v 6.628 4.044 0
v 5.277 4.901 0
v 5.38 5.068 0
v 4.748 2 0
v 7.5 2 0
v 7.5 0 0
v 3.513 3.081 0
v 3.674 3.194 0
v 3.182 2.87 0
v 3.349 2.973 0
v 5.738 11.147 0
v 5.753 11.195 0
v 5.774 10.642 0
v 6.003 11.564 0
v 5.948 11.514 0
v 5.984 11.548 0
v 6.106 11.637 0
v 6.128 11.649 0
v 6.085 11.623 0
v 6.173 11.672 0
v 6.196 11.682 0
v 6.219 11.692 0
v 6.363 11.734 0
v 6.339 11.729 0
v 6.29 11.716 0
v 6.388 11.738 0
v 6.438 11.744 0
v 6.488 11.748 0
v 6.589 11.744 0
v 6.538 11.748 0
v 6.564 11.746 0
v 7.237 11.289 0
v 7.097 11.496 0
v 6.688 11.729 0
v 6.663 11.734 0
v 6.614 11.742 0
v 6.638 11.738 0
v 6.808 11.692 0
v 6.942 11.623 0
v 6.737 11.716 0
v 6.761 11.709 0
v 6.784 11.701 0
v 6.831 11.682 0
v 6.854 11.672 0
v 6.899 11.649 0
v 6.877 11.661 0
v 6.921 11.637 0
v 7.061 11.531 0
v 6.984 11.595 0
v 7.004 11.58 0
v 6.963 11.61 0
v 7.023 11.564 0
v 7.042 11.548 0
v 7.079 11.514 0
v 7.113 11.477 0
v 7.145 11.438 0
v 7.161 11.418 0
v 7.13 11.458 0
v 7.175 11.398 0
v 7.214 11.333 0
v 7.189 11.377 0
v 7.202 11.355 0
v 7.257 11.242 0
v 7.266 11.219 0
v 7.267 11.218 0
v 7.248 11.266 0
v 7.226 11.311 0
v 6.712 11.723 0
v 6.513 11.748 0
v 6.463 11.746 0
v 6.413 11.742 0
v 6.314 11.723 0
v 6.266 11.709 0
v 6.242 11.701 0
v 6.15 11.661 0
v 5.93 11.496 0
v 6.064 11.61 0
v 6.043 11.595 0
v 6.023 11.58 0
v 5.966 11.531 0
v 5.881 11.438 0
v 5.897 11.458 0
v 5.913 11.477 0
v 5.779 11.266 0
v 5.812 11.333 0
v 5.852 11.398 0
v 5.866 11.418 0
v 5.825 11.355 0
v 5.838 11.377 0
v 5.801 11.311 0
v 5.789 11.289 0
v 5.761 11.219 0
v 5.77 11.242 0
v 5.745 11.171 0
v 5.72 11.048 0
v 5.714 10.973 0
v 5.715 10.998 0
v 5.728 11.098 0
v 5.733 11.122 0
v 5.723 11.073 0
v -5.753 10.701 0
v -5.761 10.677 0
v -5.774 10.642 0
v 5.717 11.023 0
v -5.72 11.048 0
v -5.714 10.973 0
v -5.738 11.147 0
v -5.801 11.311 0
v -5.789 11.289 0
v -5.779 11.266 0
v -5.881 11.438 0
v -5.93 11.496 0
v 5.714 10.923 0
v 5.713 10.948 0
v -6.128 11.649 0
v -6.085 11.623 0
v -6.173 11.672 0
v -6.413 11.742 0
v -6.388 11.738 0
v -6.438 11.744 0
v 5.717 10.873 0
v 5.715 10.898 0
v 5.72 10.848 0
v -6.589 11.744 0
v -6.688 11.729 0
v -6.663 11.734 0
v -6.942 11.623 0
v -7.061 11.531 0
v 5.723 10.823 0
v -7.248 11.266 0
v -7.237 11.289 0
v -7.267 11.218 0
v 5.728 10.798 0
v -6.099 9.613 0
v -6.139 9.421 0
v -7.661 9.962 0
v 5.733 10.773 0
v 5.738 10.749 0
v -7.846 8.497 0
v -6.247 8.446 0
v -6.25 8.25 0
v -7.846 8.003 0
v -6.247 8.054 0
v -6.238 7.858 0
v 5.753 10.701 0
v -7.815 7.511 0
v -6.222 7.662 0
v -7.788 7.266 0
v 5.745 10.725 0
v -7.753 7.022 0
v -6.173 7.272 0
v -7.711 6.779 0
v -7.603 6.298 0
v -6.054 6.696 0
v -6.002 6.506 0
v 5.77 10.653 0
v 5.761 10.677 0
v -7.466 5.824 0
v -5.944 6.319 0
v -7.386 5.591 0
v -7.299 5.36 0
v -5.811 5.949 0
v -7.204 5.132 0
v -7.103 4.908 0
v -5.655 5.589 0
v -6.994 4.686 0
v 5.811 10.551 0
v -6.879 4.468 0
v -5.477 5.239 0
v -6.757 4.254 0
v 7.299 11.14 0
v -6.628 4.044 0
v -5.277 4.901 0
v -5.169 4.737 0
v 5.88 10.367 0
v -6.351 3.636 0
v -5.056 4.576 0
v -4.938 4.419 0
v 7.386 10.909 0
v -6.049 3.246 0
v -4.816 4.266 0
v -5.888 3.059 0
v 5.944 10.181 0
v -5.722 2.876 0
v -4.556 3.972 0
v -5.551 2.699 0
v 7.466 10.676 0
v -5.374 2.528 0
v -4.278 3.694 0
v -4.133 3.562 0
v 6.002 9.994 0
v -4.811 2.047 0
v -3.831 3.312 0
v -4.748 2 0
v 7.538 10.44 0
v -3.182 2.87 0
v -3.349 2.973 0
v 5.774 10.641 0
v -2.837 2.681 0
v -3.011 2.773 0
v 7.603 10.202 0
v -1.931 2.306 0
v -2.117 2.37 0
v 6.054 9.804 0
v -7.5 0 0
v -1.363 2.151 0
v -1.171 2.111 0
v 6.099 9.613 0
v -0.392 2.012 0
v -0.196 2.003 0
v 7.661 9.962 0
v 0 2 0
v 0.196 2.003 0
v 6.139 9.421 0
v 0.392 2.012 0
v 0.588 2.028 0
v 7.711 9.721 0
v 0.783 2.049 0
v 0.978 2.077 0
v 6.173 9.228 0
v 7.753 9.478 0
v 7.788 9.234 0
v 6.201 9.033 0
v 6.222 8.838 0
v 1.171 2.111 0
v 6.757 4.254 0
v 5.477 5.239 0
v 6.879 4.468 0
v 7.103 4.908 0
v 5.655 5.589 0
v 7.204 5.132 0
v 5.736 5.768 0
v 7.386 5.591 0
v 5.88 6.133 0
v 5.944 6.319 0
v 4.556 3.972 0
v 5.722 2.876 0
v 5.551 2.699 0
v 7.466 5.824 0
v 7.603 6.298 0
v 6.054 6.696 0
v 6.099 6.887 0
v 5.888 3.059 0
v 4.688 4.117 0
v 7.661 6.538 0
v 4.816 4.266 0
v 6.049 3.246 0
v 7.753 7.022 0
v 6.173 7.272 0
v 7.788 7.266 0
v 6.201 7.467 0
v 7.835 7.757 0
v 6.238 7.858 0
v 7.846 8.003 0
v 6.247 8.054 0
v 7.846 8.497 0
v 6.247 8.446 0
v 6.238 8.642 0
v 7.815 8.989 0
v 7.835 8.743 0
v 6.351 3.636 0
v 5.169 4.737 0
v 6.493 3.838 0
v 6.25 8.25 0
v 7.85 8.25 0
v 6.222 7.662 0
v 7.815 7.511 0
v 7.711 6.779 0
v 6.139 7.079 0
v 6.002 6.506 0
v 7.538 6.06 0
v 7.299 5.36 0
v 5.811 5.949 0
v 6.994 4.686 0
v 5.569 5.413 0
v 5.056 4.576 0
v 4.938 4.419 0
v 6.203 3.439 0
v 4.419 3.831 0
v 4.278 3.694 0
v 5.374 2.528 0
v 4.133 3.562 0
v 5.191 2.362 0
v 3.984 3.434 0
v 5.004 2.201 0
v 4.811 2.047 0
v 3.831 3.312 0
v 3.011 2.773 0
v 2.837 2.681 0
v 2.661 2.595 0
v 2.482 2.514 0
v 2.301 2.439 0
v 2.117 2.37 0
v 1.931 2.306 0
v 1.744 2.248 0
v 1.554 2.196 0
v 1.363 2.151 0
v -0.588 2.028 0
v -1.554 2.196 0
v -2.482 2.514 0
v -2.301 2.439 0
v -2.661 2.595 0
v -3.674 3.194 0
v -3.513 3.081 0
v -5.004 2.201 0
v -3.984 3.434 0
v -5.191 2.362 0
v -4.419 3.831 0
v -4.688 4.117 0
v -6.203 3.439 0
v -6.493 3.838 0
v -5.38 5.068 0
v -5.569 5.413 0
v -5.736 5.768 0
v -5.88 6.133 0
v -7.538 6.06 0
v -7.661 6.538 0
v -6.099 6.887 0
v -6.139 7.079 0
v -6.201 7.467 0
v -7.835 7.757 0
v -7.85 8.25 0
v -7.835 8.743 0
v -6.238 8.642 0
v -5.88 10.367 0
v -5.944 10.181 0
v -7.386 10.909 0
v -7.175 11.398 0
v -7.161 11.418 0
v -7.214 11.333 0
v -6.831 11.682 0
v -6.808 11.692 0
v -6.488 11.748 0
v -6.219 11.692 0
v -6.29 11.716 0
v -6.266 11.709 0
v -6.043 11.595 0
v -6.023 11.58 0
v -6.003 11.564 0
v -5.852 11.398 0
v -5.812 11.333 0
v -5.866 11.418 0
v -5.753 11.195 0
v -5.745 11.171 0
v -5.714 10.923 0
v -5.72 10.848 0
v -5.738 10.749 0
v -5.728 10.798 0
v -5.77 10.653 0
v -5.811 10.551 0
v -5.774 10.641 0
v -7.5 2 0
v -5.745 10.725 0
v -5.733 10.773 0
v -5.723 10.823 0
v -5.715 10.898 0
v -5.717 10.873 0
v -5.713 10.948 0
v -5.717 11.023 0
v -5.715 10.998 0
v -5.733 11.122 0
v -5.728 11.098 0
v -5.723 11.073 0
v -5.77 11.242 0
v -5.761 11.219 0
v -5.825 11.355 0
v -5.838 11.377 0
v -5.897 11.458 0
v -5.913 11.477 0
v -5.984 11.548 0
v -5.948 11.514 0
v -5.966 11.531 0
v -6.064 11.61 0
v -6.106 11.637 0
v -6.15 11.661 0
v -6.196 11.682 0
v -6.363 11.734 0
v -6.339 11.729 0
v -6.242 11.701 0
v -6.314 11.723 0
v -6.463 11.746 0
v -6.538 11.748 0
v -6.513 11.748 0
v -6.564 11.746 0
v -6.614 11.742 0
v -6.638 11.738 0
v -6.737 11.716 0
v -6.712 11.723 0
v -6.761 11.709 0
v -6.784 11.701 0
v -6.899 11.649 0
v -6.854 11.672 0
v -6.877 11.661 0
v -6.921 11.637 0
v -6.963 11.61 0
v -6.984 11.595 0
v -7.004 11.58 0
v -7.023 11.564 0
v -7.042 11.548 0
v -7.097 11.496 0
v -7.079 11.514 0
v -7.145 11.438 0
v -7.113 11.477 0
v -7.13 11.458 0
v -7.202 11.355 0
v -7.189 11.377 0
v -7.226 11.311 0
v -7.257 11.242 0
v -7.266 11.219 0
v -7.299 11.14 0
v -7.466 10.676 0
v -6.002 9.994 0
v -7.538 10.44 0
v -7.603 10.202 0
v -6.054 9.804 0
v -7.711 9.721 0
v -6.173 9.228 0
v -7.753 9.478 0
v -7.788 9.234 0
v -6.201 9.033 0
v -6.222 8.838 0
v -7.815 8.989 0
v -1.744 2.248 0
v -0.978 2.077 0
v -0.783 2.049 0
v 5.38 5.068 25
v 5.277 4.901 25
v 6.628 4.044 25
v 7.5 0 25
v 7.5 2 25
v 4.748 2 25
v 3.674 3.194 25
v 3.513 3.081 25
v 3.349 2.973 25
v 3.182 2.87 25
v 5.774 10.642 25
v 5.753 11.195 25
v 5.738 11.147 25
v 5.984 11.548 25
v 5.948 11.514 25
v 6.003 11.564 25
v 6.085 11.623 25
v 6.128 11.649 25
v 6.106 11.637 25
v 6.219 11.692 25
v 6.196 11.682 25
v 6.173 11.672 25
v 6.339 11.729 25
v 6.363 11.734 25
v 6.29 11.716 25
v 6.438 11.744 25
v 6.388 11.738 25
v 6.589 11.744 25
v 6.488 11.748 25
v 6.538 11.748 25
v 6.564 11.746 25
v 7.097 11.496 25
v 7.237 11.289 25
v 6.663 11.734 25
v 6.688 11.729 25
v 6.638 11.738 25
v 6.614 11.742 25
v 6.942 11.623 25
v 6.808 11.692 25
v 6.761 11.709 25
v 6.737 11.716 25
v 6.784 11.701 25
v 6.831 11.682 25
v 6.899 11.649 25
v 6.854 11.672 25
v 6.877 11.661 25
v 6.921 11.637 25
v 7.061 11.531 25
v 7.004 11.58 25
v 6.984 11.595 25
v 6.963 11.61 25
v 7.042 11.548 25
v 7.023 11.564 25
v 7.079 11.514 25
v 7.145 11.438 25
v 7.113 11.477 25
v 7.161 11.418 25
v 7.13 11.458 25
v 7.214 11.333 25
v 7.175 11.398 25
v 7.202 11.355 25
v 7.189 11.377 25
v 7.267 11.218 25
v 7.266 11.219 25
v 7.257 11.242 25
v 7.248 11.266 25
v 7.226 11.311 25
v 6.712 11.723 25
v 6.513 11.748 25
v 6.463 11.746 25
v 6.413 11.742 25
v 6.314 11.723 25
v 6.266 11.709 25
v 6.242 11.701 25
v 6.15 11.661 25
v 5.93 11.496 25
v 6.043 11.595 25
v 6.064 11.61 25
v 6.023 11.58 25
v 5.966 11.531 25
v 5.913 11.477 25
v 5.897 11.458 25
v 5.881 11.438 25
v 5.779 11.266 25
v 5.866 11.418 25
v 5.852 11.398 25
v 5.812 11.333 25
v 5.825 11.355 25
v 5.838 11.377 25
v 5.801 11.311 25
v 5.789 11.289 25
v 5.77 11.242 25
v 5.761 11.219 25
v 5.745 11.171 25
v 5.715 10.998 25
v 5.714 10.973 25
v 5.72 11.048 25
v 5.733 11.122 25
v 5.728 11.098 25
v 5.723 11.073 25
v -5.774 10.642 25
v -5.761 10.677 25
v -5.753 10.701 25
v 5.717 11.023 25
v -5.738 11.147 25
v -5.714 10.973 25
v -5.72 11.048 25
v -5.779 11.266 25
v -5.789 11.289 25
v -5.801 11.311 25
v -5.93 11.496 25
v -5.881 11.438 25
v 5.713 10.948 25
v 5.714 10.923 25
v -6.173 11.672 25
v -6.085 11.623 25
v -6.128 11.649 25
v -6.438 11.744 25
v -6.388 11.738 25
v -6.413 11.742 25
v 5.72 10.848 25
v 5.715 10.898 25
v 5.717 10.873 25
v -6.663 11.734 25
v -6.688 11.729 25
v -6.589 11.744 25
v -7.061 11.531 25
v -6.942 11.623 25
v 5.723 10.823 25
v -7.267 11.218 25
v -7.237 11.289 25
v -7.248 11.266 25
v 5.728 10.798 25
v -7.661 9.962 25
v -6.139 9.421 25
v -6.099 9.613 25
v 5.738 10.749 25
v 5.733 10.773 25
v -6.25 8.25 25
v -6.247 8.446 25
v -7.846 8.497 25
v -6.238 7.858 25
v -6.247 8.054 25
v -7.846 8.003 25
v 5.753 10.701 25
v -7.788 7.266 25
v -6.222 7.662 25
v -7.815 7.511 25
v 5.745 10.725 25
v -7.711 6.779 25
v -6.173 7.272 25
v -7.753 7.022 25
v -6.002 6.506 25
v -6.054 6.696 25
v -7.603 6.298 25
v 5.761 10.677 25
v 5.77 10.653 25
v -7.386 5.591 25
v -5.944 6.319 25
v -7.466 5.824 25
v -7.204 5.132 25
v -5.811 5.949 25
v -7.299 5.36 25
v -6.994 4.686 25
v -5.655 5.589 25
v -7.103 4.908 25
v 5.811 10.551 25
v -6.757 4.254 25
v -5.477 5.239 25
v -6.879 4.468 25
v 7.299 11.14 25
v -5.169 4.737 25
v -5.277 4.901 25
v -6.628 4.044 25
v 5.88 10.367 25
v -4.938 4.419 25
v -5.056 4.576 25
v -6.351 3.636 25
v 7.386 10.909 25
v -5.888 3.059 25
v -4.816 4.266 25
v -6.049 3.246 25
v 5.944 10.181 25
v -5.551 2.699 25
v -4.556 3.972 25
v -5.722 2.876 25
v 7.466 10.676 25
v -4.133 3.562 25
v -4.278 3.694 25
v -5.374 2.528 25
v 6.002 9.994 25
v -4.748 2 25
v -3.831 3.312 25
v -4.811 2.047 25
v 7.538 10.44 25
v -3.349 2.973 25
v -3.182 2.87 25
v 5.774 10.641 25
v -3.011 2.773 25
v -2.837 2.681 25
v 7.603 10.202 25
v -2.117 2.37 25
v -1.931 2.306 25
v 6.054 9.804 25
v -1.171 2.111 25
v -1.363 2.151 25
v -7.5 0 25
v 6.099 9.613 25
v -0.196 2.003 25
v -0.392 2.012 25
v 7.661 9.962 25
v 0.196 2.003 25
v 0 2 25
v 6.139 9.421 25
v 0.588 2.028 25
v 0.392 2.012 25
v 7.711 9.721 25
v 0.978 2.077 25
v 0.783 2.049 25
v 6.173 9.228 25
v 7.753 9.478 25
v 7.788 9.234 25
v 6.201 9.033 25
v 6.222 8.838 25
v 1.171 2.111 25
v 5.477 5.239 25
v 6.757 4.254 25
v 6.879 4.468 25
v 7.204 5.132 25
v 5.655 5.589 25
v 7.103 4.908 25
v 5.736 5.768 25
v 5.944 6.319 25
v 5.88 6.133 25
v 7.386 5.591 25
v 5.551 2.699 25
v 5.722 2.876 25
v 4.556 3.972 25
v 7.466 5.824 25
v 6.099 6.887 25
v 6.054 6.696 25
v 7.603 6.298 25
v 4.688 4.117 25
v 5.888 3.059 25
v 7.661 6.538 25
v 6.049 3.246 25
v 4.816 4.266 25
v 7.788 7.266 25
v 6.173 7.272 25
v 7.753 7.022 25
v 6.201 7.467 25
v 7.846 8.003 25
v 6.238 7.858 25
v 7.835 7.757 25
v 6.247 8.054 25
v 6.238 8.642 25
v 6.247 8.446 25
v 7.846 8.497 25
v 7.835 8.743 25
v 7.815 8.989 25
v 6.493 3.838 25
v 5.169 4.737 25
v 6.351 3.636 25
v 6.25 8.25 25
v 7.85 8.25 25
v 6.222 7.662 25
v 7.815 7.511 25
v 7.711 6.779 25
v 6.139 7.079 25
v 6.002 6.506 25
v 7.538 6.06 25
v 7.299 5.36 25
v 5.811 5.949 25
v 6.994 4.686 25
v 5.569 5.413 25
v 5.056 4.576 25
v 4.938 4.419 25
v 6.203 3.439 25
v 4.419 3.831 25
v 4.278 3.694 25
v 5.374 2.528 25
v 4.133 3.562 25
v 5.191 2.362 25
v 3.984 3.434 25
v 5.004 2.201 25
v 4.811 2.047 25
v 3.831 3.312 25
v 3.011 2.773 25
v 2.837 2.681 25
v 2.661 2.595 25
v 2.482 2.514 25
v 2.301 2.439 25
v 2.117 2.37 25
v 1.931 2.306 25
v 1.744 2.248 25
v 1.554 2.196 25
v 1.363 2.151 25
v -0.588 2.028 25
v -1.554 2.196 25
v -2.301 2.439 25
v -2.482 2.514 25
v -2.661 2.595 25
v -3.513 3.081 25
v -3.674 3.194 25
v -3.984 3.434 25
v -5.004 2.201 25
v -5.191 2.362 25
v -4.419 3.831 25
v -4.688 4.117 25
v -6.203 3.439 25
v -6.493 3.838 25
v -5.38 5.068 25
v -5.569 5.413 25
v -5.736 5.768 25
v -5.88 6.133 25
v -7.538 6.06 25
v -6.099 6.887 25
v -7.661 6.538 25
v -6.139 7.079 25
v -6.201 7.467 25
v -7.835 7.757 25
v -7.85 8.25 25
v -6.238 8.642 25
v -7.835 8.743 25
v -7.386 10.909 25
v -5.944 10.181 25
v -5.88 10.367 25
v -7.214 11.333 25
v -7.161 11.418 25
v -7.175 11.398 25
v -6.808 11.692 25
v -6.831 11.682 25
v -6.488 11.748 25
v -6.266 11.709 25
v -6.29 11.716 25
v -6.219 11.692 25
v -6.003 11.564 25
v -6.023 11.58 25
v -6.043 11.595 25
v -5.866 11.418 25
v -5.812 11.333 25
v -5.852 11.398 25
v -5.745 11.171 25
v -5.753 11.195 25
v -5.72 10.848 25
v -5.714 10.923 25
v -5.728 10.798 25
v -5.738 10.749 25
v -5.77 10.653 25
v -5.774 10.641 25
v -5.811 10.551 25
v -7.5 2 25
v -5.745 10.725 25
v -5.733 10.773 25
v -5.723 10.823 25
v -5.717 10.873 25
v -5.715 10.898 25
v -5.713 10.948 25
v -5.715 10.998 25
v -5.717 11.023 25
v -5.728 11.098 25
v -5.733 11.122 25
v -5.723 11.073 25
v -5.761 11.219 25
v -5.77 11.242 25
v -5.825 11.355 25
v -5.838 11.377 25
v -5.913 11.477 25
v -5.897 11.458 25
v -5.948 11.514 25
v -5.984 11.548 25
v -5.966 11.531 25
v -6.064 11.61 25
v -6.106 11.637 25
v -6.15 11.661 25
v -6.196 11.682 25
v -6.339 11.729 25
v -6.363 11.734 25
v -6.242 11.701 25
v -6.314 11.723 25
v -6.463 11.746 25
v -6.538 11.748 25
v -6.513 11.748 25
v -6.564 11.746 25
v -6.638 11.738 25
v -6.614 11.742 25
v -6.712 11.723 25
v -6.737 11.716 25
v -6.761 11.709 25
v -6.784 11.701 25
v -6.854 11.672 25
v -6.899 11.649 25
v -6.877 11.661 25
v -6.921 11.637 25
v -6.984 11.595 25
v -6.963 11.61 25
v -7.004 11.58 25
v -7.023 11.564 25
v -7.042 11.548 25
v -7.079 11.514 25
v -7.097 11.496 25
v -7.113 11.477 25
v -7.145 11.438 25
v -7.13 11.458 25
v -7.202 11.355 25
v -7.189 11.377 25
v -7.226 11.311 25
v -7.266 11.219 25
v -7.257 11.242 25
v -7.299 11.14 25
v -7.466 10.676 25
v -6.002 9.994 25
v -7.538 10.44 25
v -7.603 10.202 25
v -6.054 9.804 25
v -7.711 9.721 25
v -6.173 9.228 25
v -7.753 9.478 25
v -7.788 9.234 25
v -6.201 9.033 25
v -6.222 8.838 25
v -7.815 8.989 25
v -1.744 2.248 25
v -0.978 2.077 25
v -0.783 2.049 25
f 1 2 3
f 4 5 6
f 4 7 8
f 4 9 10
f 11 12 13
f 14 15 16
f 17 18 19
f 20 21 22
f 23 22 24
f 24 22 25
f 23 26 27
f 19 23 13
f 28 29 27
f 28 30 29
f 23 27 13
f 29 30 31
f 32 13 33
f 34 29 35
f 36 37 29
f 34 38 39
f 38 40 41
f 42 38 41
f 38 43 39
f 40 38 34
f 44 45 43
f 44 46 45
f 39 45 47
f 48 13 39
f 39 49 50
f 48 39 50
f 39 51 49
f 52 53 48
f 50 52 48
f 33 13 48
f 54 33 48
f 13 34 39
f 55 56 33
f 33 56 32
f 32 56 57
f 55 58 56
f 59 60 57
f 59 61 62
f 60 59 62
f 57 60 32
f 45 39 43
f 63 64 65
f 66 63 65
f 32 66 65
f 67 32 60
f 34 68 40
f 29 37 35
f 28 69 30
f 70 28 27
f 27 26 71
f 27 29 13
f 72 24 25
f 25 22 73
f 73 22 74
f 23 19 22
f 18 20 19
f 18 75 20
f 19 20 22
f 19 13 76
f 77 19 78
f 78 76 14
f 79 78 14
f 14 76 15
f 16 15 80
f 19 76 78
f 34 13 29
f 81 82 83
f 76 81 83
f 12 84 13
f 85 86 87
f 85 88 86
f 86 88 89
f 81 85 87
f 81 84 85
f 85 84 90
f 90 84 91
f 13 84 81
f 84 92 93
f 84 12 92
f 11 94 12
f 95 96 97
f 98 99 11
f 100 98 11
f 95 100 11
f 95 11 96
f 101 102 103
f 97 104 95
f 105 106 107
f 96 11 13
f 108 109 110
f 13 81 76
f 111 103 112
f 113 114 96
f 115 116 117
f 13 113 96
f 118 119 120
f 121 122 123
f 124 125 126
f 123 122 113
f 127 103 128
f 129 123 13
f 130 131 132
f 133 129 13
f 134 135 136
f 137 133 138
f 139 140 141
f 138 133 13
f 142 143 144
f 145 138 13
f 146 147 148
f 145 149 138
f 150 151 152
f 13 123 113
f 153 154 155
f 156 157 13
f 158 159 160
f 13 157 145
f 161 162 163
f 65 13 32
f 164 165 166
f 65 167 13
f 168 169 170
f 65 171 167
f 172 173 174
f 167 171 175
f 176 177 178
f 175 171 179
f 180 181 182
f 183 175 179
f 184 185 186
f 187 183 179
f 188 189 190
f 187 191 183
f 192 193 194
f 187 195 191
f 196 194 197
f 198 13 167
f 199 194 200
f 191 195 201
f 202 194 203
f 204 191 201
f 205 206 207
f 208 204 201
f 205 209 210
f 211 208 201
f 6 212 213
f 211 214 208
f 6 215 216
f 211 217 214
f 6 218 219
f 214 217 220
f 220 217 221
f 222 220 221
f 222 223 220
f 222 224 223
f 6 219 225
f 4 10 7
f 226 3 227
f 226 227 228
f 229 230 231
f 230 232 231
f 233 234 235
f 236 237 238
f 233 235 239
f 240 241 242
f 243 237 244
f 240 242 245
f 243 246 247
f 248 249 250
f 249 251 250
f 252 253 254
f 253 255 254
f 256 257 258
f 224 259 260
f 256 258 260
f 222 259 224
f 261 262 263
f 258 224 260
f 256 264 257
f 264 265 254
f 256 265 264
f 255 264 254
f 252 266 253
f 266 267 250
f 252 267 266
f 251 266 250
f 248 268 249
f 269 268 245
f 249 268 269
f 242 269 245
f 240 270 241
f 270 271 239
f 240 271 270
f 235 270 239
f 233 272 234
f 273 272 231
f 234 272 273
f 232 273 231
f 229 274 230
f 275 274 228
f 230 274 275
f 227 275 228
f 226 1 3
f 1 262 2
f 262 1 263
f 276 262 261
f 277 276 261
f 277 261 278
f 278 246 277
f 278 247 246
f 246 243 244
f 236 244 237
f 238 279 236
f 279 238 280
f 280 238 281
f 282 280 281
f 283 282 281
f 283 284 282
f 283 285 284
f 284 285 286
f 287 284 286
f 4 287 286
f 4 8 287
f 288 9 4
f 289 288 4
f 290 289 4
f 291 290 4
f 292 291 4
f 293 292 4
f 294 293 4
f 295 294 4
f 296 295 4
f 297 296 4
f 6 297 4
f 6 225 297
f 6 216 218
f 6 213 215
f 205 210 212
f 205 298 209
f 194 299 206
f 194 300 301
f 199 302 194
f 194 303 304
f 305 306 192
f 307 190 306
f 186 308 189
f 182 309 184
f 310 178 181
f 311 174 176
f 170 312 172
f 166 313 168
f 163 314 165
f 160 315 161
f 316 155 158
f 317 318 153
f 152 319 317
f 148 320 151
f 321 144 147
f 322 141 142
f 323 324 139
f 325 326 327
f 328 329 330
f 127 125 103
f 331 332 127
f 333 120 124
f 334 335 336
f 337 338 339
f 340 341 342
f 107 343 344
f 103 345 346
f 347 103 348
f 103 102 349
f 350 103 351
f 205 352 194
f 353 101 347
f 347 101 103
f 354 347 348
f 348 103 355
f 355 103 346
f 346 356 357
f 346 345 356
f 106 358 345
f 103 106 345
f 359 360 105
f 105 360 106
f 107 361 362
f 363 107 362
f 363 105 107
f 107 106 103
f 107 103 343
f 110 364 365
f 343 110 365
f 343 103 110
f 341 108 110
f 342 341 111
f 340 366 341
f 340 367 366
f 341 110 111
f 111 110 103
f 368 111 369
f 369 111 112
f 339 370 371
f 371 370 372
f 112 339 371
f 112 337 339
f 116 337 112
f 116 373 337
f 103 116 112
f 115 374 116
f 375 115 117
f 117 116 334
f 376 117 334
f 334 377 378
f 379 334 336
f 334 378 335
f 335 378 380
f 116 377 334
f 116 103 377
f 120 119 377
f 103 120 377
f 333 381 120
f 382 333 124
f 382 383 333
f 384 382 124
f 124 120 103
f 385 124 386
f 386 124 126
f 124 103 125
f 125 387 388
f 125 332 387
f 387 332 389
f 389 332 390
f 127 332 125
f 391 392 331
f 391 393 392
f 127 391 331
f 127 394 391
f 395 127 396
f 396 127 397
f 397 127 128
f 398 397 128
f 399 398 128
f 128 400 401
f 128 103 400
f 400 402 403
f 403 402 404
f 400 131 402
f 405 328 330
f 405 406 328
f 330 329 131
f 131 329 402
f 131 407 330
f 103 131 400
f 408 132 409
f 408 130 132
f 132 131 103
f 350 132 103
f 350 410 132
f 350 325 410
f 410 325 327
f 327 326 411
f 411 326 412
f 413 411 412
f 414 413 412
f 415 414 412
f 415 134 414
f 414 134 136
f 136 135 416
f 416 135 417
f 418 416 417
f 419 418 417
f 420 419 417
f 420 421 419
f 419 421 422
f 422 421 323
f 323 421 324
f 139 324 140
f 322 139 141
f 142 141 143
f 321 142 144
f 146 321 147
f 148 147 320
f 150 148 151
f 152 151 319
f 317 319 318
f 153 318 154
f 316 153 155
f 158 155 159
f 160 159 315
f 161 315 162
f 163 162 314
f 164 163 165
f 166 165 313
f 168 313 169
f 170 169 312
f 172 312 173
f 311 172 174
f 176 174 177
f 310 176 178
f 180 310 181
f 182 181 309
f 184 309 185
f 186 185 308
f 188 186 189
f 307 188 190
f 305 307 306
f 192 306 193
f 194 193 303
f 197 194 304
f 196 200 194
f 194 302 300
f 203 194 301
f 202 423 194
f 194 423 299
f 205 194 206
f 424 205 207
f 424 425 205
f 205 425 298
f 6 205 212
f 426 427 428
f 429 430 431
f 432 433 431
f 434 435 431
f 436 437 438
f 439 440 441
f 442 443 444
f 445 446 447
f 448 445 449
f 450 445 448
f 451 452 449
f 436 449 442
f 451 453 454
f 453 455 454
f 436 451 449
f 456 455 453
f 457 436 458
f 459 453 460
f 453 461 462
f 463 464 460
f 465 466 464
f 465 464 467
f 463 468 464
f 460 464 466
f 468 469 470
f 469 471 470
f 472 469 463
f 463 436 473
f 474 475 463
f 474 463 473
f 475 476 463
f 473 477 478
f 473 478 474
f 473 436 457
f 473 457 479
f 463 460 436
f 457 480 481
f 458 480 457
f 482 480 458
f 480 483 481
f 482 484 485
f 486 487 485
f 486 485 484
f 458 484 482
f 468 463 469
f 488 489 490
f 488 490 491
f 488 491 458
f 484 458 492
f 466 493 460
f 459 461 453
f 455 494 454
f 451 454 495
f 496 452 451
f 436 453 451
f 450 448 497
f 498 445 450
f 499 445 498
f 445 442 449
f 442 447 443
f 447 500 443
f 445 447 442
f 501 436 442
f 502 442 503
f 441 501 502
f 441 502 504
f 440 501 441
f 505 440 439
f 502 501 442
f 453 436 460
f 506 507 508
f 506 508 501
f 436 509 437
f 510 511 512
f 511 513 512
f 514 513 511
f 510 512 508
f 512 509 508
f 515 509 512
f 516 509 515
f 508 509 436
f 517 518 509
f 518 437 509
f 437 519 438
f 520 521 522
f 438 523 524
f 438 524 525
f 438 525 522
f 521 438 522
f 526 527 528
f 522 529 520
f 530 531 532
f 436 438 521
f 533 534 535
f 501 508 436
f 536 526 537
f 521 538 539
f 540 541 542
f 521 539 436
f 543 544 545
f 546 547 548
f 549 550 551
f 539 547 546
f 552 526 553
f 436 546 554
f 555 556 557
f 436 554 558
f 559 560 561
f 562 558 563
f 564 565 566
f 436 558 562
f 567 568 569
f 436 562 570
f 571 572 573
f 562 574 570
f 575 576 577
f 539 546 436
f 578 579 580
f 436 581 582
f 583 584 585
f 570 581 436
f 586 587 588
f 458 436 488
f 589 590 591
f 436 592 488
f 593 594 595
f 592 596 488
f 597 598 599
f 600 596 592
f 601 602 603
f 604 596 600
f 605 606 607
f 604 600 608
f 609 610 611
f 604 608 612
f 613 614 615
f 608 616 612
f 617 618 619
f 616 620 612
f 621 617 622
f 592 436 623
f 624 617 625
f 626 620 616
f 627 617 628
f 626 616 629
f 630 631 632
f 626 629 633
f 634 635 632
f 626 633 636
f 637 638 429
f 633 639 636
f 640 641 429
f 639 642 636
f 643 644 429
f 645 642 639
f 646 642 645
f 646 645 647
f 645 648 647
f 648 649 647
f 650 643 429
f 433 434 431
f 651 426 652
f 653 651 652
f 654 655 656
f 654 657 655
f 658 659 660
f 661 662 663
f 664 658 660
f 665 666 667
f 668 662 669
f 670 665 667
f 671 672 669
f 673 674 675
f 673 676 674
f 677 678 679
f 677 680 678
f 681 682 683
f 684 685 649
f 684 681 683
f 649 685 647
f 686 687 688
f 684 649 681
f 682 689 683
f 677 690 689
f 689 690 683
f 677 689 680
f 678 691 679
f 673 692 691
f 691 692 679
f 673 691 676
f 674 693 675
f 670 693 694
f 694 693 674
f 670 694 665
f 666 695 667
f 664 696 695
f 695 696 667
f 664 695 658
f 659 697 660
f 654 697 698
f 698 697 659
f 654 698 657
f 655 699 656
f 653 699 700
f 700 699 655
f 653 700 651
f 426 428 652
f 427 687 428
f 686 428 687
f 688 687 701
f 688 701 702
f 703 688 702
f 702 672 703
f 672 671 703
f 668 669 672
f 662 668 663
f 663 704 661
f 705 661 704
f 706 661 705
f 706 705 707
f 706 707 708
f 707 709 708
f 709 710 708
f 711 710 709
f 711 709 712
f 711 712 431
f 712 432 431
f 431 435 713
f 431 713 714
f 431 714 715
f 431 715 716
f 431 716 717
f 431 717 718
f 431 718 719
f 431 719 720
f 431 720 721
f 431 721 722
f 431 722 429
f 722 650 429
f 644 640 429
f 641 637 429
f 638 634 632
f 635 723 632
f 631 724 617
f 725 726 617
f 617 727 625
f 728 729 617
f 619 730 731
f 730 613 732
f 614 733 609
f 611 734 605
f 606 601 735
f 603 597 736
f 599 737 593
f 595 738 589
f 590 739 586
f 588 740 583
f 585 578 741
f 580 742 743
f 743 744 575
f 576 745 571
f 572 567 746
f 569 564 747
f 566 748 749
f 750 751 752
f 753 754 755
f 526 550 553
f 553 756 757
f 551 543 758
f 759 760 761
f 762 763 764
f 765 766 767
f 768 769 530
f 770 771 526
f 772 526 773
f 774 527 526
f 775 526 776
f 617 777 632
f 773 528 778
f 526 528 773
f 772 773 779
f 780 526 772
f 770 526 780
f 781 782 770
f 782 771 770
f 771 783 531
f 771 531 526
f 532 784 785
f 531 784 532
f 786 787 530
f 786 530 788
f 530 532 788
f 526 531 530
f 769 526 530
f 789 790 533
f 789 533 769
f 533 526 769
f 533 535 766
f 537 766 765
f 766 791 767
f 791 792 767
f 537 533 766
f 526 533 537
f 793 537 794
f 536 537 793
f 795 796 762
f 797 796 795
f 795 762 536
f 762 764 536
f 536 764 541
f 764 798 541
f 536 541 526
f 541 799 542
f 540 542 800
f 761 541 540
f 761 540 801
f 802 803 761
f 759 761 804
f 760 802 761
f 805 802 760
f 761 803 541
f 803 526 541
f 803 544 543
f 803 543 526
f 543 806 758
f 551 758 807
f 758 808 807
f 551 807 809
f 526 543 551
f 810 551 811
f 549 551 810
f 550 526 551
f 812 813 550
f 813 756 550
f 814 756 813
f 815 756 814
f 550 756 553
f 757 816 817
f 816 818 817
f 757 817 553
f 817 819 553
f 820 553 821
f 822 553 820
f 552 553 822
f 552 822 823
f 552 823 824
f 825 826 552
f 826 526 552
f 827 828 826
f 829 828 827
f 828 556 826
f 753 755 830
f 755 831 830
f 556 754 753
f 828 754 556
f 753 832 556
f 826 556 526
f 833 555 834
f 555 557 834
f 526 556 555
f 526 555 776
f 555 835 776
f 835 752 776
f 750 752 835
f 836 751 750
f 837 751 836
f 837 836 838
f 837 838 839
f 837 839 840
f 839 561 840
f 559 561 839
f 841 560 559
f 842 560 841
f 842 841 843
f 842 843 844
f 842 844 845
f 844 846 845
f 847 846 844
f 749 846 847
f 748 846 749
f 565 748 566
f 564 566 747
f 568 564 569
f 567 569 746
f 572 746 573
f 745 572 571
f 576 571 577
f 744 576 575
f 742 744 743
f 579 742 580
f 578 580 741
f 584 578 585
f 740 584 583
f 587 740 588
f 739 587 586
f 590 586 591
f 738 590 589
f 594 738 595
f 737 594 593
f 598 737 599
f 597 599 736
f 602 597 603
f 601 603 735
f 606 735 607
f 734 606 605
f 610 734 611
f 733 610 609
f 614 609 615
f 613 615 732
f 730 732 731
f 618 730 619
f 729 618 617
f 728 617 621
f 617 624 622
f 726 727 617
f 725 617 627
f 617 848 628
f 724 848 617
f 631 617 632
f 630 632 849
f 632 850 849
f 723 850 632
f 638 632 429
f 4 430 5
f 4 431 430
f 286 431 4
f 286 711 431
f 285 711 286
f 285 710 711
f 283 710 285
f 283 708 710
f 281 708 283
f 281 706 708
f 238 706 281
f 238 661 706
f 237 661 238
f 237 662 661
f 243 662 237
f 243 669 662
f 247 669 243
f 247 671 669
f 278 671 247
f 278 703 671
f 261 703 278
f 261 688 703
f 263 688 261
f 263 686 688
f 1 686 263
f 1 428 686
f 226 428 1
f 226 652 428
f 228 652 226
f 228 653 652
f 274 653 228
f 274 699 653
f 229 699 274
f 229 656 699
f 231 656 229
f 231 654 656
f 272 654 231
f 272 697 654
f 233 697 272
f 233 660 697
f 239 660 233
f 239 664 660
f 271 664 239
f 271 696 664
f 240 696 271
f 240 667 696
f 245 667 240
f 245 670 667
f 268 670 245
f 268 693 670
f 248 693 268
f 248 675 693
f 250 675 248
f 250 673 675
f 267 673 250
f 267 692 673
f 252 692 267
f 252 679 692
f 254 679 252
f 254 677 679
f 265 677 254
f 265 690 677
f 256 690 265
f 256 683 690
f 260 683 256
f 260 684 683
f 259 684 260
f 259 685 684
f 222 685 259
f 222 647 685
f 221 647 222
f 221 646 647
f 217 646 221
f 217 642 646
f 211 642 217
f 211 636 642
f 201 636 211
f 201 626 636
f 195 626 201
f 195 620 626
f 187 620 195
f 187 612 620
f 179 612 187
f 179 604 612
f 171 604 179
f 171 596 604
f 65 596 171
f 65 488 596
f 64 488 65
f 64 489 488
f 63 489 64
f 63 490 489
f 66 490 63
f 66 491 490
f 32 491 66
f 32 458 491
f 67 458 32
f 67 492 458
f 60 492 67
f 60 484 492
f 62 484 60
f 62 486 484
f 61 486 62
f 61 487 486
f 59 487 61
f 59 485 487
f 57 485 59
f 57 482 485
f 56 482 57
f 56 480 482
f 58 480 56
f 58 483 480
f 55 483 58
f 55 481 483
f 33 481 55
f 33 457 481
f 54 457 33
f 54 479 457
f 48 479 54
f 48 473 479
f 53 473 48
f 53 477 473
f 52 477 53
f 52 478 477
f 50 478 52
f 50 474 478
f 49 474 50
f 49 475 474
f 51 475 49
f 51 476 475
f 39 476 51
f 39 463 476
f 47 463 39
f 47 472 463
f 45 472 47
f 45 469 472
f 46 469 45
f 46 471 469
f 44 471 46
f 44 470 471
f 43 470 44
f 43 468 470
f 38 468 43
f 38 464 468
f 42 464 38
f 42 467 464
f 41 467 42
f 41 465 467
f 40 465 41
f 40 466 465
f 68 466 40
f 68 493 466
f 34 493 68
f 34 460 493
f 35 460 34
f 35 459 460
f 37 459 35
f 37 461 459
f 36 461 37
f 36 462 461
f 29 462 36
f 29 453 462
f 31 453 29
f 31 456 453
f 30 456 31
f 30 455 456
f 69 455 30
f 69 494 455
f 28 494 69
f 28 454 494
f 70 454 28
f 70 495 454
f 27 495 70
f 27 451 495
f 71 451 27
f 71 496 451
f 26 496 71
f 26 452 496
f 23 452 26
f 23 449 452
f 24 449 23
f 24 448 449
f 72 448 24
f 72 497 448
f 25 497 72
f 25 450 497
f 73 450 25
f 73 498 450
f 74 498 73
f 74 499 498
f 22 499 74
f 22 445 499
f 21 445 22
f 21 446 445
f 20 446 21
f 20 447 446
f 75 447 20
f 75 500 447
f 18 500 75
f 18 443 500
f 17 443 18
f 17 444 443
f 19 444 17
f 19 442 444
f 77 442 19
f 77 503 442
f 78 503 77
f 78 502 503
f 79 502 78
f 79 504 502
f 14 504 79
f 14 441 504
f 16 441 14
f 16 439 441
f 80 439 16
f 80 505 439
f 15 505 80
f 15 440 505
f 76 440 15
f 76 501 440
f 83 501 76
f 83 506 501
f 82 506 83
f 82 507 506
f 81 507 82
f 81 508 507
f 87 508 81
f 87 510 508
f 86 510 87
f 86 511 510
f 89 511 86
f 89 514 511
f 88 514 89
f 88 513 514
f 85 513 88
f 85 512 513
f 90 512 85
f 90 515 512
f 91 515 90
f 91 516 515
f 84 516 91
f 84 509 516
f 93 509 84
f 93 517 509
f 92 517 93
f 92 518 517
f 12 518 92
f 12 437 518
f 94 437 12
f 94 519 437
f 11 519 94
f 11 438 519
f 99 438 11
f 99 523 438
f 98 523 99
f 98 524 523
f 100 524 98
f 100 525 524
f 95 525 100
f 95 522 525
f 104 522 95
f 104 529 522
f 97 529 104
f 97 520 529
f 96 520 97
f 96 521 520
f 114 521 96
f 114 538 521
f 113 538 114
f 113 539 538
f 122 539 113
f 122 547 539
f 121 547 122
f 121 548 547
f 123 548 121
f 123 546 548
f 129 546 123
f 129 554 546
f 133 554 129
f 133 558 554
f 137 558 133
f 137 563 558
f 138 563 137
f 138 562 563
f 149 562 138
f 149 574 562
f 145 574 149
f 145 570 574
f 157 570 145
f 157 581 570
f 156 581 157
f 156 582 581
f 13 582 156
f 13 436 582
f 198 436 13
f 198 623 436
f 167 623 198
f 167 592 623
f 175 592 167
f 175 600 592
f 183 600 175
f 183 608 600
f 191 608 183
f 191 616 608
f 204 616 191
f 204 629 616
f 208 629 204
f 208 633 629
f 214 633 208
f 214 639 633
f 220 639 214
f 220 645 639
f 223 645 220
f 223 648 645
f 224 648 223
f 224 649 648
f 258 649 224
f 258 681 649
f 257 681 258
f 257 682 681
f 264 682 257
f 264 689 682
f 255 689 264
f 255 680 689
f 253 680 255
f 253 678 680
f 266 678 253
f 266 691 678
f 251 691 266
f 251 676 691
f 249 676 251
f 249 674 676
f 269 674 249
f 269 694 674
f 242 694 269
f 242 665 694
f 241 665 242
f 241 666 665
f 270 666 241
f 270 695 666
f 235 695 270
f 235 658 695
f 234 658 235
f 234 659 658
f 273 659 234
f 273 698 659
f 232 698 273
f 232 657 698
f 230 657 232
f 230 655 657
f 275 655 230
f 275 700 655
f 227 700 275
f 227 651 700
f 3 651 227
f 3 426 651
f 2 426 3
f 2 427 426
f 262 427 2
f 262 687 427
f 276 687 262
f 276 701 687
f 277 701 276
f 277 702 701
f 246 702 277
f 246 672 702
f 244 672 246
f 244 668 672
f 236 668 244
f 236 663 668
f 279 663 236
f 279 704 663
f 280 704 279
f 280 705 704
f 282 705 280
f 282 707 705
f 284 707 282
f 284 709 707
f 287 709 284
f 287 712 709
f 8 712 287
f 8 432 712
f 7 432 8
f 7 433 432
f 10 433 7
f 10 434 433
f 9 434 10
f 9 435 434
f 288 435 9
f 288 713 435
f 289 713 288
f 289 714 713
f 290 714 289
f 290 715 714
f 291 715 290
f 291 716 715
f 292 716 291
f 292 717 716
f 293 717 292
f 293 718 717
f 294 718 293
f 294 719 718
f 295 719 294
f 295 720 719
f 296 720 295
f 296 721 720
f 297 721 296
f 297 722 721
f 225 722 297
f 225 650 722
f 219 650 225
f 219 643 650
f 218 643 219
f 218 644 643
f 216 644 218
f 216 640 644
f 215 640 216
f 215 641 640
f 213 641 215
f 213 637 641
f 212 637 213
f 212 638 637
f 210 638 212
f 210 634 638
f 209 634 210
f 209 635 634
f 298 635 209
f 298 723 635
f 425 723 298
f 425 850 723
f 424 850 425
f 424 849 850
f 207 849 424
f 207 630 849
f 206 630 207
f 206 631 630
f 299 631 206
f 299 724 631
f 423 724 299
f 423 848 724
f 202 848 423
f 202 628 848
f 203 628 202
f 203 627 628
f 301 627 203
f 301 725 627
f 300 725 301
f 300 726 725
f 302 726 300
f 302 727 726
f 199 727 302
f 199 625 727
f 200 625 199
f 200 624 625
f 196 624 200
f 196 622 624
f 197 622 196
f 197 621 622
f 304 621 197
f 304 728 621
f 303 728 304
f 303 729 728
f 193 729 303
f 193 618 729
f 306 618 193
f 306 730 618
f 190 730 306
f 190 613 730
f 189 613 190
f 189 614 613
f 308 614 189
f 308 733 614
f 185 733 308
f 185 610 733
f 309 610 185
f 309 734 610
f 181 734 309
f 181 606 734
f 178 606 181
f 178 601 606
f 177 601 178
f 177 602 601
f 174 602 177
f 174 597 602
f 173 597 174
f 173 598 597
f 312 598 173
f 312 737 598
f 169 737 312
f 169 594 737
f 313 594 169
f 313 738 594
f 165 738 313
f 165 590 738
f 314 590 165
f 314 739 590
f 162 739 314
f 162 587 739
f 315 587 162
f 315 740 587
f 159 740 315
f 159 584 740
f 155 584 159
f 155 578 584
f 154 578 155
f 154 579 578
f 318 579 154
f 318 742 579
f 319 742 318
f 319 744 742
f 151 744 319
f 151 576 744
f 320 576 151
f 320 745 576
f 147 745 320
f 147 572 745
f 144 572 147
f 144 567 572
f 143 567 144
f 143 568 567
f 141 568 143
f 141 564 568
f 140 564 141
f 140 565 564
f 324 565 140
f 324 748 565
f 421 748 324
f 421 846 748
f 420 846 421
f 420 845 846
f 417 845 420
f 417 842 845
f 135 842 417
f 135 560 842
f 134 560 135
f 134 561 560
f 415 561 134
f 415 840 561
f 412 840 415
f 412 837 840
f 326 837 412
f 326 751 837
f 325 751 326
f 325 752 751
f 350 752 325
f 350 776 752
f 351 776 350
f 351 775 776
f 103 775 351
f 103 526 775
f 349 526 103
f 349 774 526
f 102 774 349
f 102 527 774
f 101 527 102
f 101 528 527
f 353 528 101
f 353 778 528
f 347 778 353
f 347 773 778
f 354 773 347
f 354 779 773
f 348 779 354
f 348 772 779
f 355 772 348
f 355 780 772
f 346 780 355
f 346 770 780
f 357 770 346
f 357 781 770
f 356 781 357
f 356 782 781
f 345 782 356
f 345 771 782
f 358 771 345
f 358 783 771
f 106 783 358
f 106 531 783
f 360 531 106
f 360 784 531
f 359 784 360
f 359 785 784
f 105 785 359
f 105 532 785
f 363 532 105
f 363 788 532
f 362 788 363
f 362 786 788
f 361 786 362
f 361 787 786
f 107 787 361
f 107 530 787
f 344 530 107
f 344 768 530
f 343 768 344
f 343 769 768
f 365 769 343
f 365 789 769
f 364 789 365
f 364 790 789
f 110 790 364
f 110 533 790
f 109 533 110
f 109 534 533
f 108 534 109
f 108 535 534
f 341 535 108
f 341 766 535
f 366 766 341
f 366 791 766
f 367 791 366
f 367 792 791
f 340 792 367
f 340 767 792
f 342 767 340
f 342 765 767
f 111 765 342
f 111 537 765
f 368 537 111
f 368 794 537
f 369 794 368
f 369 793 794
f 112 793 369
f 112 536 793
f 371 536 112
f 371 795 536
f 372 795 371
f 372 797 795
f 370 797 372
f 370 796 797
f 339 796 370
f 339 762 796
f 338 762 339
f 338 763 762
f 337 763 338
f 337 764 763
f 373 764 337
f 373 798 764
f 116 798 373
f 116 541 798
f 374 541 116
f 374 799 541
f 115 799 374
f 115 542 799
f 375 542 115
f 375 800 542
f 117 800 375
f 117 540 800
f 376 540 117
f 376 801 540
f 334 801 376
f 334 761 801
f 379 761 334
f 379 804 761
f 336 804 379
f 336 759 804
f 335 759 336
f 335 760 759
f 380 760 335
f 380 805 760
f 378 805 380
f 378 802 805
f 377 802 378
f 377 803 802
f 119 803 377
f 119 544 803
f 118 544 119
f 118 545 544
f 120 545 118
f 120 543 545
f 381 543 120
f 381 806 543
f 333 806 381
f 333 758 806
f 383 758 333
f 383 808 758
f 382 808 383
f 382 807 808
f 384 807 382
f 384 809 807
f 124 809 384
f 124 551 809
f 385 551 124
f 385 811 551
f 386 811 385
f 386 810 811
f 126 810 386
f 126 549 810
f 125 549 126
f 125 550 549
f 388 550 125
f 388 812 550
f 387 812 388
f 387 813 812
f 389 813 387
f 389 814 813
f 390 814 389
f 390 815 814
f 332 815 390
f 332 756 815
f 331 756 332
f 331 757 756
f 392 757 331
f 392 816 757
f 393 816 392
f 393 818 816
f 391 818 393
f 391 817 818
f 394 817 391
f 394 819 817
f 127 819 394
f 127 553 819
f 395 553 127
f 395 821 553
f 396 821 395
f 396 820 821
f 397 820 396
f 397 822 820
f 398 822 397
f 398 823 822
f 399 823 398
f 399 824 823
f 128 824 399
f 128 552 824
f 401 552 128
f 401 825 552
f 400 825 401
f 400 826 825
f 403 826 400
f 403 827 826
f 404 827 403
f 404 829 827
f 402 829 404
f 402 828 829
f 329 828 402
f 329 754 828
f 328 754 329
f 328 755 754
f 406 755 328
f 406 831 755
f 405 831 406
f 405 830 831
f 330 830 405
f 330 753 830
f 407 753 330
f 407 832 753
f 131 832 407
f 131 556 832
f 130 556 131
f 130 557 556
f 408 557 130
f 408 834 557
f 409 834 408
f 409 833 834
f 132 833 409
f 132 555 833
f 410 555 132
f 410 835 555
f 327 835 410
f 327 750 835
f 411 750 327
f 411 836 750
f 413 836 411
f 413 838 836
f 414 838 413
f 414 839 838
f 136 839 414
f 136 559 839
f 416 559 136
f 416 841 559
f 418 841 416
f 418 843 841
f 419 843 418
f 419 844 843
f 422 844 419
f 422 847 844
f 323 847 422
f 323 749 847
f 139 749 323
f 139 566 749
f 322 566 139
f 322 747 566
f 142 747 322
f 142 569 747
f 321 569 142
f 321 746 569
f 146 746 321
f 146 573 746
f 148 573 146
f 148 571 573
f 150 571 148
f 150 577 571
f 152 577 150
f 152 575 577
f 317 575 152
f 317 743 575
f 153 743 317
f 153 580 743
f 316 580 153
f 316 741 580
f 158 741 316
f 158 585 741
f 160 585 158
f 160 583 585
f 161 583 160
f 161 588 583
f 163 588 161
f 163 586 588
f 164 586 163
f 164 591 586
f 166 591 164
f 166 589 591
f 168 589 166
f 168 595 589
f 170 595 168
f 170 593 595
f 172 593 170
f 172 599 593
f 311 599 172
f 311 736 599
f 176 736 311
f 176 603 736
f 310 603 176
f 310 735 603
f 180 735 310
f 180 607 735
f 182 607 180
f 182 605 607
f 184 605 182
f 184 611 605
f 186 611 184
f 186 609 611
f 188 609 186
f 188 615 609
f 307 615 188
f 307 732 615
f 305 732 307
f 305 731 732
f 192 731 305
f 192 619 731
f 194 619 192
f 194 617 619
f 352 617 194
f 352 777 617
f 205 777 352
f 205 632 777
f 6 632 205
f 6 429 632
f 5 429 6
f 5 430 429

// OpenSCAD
// Width of base
baseWidth = 15;
// Length of base
baseLength = 25;
// Thickness of base
baseThickness = 2;

// Inner diameter for holding pen/marker
ID = 12.5;
// Thickness of C shaped clip
clipThickness = 1.6;
// Angle of opening in C shaped clip
clipAngle = 135;
// Circle detail (number of vertices)
$fn = 200;

OD = ID+clipThickness*2;

linear_extrude(baseLength) union() {
  translate([-baseWidth/2, 0]) square([baseWidth, baseThickness]);

  translate([0,ID/2+baseThickness]) {
    difference() {
      circle(d=OD,h=baseLength, center=true);
      circle(d=ID,h=baseLength+2, center=true);
      translate([0,0,-(baseLength+2)/2])
        rotate(90) pieSlice(OD, clipAngle);
    }

    R = (OD + ID)/4;
    d = (OD - ID)/2;
    rotate(90) mirrorY() translate([R*cos(clipAngle/2),R*sin(clipAngle/2)]) 
      circle(d=d, h=baseLength);
  }

}

module pieSlice(r,a) {
  x = r*cos(a/2);
  y = r*sin(a/2);
  if (a > 180)
    polygon([[0,0],[x,y],[x,r],[r,r],[r,-r],[x,-r],[x,-y]]);
  else
    polygon([[0,0],[x,y],[r,y],[r,-y],[x,-y]]);
}

module mirrorX() {
  for (i=[0:1]) mirror([i,0]) children();
}

module mirrorY() {
  for (i=[0:1]) mirror([0,i]) children();
}

module mirrorXY() {
  for (i=[0:1], j=[0:1]) mirror([i,0]) mirror([0,j]) children();
}

module mirrorZ() {
  for (i=[0:1]) mirror([0,0,i]) children();
}
